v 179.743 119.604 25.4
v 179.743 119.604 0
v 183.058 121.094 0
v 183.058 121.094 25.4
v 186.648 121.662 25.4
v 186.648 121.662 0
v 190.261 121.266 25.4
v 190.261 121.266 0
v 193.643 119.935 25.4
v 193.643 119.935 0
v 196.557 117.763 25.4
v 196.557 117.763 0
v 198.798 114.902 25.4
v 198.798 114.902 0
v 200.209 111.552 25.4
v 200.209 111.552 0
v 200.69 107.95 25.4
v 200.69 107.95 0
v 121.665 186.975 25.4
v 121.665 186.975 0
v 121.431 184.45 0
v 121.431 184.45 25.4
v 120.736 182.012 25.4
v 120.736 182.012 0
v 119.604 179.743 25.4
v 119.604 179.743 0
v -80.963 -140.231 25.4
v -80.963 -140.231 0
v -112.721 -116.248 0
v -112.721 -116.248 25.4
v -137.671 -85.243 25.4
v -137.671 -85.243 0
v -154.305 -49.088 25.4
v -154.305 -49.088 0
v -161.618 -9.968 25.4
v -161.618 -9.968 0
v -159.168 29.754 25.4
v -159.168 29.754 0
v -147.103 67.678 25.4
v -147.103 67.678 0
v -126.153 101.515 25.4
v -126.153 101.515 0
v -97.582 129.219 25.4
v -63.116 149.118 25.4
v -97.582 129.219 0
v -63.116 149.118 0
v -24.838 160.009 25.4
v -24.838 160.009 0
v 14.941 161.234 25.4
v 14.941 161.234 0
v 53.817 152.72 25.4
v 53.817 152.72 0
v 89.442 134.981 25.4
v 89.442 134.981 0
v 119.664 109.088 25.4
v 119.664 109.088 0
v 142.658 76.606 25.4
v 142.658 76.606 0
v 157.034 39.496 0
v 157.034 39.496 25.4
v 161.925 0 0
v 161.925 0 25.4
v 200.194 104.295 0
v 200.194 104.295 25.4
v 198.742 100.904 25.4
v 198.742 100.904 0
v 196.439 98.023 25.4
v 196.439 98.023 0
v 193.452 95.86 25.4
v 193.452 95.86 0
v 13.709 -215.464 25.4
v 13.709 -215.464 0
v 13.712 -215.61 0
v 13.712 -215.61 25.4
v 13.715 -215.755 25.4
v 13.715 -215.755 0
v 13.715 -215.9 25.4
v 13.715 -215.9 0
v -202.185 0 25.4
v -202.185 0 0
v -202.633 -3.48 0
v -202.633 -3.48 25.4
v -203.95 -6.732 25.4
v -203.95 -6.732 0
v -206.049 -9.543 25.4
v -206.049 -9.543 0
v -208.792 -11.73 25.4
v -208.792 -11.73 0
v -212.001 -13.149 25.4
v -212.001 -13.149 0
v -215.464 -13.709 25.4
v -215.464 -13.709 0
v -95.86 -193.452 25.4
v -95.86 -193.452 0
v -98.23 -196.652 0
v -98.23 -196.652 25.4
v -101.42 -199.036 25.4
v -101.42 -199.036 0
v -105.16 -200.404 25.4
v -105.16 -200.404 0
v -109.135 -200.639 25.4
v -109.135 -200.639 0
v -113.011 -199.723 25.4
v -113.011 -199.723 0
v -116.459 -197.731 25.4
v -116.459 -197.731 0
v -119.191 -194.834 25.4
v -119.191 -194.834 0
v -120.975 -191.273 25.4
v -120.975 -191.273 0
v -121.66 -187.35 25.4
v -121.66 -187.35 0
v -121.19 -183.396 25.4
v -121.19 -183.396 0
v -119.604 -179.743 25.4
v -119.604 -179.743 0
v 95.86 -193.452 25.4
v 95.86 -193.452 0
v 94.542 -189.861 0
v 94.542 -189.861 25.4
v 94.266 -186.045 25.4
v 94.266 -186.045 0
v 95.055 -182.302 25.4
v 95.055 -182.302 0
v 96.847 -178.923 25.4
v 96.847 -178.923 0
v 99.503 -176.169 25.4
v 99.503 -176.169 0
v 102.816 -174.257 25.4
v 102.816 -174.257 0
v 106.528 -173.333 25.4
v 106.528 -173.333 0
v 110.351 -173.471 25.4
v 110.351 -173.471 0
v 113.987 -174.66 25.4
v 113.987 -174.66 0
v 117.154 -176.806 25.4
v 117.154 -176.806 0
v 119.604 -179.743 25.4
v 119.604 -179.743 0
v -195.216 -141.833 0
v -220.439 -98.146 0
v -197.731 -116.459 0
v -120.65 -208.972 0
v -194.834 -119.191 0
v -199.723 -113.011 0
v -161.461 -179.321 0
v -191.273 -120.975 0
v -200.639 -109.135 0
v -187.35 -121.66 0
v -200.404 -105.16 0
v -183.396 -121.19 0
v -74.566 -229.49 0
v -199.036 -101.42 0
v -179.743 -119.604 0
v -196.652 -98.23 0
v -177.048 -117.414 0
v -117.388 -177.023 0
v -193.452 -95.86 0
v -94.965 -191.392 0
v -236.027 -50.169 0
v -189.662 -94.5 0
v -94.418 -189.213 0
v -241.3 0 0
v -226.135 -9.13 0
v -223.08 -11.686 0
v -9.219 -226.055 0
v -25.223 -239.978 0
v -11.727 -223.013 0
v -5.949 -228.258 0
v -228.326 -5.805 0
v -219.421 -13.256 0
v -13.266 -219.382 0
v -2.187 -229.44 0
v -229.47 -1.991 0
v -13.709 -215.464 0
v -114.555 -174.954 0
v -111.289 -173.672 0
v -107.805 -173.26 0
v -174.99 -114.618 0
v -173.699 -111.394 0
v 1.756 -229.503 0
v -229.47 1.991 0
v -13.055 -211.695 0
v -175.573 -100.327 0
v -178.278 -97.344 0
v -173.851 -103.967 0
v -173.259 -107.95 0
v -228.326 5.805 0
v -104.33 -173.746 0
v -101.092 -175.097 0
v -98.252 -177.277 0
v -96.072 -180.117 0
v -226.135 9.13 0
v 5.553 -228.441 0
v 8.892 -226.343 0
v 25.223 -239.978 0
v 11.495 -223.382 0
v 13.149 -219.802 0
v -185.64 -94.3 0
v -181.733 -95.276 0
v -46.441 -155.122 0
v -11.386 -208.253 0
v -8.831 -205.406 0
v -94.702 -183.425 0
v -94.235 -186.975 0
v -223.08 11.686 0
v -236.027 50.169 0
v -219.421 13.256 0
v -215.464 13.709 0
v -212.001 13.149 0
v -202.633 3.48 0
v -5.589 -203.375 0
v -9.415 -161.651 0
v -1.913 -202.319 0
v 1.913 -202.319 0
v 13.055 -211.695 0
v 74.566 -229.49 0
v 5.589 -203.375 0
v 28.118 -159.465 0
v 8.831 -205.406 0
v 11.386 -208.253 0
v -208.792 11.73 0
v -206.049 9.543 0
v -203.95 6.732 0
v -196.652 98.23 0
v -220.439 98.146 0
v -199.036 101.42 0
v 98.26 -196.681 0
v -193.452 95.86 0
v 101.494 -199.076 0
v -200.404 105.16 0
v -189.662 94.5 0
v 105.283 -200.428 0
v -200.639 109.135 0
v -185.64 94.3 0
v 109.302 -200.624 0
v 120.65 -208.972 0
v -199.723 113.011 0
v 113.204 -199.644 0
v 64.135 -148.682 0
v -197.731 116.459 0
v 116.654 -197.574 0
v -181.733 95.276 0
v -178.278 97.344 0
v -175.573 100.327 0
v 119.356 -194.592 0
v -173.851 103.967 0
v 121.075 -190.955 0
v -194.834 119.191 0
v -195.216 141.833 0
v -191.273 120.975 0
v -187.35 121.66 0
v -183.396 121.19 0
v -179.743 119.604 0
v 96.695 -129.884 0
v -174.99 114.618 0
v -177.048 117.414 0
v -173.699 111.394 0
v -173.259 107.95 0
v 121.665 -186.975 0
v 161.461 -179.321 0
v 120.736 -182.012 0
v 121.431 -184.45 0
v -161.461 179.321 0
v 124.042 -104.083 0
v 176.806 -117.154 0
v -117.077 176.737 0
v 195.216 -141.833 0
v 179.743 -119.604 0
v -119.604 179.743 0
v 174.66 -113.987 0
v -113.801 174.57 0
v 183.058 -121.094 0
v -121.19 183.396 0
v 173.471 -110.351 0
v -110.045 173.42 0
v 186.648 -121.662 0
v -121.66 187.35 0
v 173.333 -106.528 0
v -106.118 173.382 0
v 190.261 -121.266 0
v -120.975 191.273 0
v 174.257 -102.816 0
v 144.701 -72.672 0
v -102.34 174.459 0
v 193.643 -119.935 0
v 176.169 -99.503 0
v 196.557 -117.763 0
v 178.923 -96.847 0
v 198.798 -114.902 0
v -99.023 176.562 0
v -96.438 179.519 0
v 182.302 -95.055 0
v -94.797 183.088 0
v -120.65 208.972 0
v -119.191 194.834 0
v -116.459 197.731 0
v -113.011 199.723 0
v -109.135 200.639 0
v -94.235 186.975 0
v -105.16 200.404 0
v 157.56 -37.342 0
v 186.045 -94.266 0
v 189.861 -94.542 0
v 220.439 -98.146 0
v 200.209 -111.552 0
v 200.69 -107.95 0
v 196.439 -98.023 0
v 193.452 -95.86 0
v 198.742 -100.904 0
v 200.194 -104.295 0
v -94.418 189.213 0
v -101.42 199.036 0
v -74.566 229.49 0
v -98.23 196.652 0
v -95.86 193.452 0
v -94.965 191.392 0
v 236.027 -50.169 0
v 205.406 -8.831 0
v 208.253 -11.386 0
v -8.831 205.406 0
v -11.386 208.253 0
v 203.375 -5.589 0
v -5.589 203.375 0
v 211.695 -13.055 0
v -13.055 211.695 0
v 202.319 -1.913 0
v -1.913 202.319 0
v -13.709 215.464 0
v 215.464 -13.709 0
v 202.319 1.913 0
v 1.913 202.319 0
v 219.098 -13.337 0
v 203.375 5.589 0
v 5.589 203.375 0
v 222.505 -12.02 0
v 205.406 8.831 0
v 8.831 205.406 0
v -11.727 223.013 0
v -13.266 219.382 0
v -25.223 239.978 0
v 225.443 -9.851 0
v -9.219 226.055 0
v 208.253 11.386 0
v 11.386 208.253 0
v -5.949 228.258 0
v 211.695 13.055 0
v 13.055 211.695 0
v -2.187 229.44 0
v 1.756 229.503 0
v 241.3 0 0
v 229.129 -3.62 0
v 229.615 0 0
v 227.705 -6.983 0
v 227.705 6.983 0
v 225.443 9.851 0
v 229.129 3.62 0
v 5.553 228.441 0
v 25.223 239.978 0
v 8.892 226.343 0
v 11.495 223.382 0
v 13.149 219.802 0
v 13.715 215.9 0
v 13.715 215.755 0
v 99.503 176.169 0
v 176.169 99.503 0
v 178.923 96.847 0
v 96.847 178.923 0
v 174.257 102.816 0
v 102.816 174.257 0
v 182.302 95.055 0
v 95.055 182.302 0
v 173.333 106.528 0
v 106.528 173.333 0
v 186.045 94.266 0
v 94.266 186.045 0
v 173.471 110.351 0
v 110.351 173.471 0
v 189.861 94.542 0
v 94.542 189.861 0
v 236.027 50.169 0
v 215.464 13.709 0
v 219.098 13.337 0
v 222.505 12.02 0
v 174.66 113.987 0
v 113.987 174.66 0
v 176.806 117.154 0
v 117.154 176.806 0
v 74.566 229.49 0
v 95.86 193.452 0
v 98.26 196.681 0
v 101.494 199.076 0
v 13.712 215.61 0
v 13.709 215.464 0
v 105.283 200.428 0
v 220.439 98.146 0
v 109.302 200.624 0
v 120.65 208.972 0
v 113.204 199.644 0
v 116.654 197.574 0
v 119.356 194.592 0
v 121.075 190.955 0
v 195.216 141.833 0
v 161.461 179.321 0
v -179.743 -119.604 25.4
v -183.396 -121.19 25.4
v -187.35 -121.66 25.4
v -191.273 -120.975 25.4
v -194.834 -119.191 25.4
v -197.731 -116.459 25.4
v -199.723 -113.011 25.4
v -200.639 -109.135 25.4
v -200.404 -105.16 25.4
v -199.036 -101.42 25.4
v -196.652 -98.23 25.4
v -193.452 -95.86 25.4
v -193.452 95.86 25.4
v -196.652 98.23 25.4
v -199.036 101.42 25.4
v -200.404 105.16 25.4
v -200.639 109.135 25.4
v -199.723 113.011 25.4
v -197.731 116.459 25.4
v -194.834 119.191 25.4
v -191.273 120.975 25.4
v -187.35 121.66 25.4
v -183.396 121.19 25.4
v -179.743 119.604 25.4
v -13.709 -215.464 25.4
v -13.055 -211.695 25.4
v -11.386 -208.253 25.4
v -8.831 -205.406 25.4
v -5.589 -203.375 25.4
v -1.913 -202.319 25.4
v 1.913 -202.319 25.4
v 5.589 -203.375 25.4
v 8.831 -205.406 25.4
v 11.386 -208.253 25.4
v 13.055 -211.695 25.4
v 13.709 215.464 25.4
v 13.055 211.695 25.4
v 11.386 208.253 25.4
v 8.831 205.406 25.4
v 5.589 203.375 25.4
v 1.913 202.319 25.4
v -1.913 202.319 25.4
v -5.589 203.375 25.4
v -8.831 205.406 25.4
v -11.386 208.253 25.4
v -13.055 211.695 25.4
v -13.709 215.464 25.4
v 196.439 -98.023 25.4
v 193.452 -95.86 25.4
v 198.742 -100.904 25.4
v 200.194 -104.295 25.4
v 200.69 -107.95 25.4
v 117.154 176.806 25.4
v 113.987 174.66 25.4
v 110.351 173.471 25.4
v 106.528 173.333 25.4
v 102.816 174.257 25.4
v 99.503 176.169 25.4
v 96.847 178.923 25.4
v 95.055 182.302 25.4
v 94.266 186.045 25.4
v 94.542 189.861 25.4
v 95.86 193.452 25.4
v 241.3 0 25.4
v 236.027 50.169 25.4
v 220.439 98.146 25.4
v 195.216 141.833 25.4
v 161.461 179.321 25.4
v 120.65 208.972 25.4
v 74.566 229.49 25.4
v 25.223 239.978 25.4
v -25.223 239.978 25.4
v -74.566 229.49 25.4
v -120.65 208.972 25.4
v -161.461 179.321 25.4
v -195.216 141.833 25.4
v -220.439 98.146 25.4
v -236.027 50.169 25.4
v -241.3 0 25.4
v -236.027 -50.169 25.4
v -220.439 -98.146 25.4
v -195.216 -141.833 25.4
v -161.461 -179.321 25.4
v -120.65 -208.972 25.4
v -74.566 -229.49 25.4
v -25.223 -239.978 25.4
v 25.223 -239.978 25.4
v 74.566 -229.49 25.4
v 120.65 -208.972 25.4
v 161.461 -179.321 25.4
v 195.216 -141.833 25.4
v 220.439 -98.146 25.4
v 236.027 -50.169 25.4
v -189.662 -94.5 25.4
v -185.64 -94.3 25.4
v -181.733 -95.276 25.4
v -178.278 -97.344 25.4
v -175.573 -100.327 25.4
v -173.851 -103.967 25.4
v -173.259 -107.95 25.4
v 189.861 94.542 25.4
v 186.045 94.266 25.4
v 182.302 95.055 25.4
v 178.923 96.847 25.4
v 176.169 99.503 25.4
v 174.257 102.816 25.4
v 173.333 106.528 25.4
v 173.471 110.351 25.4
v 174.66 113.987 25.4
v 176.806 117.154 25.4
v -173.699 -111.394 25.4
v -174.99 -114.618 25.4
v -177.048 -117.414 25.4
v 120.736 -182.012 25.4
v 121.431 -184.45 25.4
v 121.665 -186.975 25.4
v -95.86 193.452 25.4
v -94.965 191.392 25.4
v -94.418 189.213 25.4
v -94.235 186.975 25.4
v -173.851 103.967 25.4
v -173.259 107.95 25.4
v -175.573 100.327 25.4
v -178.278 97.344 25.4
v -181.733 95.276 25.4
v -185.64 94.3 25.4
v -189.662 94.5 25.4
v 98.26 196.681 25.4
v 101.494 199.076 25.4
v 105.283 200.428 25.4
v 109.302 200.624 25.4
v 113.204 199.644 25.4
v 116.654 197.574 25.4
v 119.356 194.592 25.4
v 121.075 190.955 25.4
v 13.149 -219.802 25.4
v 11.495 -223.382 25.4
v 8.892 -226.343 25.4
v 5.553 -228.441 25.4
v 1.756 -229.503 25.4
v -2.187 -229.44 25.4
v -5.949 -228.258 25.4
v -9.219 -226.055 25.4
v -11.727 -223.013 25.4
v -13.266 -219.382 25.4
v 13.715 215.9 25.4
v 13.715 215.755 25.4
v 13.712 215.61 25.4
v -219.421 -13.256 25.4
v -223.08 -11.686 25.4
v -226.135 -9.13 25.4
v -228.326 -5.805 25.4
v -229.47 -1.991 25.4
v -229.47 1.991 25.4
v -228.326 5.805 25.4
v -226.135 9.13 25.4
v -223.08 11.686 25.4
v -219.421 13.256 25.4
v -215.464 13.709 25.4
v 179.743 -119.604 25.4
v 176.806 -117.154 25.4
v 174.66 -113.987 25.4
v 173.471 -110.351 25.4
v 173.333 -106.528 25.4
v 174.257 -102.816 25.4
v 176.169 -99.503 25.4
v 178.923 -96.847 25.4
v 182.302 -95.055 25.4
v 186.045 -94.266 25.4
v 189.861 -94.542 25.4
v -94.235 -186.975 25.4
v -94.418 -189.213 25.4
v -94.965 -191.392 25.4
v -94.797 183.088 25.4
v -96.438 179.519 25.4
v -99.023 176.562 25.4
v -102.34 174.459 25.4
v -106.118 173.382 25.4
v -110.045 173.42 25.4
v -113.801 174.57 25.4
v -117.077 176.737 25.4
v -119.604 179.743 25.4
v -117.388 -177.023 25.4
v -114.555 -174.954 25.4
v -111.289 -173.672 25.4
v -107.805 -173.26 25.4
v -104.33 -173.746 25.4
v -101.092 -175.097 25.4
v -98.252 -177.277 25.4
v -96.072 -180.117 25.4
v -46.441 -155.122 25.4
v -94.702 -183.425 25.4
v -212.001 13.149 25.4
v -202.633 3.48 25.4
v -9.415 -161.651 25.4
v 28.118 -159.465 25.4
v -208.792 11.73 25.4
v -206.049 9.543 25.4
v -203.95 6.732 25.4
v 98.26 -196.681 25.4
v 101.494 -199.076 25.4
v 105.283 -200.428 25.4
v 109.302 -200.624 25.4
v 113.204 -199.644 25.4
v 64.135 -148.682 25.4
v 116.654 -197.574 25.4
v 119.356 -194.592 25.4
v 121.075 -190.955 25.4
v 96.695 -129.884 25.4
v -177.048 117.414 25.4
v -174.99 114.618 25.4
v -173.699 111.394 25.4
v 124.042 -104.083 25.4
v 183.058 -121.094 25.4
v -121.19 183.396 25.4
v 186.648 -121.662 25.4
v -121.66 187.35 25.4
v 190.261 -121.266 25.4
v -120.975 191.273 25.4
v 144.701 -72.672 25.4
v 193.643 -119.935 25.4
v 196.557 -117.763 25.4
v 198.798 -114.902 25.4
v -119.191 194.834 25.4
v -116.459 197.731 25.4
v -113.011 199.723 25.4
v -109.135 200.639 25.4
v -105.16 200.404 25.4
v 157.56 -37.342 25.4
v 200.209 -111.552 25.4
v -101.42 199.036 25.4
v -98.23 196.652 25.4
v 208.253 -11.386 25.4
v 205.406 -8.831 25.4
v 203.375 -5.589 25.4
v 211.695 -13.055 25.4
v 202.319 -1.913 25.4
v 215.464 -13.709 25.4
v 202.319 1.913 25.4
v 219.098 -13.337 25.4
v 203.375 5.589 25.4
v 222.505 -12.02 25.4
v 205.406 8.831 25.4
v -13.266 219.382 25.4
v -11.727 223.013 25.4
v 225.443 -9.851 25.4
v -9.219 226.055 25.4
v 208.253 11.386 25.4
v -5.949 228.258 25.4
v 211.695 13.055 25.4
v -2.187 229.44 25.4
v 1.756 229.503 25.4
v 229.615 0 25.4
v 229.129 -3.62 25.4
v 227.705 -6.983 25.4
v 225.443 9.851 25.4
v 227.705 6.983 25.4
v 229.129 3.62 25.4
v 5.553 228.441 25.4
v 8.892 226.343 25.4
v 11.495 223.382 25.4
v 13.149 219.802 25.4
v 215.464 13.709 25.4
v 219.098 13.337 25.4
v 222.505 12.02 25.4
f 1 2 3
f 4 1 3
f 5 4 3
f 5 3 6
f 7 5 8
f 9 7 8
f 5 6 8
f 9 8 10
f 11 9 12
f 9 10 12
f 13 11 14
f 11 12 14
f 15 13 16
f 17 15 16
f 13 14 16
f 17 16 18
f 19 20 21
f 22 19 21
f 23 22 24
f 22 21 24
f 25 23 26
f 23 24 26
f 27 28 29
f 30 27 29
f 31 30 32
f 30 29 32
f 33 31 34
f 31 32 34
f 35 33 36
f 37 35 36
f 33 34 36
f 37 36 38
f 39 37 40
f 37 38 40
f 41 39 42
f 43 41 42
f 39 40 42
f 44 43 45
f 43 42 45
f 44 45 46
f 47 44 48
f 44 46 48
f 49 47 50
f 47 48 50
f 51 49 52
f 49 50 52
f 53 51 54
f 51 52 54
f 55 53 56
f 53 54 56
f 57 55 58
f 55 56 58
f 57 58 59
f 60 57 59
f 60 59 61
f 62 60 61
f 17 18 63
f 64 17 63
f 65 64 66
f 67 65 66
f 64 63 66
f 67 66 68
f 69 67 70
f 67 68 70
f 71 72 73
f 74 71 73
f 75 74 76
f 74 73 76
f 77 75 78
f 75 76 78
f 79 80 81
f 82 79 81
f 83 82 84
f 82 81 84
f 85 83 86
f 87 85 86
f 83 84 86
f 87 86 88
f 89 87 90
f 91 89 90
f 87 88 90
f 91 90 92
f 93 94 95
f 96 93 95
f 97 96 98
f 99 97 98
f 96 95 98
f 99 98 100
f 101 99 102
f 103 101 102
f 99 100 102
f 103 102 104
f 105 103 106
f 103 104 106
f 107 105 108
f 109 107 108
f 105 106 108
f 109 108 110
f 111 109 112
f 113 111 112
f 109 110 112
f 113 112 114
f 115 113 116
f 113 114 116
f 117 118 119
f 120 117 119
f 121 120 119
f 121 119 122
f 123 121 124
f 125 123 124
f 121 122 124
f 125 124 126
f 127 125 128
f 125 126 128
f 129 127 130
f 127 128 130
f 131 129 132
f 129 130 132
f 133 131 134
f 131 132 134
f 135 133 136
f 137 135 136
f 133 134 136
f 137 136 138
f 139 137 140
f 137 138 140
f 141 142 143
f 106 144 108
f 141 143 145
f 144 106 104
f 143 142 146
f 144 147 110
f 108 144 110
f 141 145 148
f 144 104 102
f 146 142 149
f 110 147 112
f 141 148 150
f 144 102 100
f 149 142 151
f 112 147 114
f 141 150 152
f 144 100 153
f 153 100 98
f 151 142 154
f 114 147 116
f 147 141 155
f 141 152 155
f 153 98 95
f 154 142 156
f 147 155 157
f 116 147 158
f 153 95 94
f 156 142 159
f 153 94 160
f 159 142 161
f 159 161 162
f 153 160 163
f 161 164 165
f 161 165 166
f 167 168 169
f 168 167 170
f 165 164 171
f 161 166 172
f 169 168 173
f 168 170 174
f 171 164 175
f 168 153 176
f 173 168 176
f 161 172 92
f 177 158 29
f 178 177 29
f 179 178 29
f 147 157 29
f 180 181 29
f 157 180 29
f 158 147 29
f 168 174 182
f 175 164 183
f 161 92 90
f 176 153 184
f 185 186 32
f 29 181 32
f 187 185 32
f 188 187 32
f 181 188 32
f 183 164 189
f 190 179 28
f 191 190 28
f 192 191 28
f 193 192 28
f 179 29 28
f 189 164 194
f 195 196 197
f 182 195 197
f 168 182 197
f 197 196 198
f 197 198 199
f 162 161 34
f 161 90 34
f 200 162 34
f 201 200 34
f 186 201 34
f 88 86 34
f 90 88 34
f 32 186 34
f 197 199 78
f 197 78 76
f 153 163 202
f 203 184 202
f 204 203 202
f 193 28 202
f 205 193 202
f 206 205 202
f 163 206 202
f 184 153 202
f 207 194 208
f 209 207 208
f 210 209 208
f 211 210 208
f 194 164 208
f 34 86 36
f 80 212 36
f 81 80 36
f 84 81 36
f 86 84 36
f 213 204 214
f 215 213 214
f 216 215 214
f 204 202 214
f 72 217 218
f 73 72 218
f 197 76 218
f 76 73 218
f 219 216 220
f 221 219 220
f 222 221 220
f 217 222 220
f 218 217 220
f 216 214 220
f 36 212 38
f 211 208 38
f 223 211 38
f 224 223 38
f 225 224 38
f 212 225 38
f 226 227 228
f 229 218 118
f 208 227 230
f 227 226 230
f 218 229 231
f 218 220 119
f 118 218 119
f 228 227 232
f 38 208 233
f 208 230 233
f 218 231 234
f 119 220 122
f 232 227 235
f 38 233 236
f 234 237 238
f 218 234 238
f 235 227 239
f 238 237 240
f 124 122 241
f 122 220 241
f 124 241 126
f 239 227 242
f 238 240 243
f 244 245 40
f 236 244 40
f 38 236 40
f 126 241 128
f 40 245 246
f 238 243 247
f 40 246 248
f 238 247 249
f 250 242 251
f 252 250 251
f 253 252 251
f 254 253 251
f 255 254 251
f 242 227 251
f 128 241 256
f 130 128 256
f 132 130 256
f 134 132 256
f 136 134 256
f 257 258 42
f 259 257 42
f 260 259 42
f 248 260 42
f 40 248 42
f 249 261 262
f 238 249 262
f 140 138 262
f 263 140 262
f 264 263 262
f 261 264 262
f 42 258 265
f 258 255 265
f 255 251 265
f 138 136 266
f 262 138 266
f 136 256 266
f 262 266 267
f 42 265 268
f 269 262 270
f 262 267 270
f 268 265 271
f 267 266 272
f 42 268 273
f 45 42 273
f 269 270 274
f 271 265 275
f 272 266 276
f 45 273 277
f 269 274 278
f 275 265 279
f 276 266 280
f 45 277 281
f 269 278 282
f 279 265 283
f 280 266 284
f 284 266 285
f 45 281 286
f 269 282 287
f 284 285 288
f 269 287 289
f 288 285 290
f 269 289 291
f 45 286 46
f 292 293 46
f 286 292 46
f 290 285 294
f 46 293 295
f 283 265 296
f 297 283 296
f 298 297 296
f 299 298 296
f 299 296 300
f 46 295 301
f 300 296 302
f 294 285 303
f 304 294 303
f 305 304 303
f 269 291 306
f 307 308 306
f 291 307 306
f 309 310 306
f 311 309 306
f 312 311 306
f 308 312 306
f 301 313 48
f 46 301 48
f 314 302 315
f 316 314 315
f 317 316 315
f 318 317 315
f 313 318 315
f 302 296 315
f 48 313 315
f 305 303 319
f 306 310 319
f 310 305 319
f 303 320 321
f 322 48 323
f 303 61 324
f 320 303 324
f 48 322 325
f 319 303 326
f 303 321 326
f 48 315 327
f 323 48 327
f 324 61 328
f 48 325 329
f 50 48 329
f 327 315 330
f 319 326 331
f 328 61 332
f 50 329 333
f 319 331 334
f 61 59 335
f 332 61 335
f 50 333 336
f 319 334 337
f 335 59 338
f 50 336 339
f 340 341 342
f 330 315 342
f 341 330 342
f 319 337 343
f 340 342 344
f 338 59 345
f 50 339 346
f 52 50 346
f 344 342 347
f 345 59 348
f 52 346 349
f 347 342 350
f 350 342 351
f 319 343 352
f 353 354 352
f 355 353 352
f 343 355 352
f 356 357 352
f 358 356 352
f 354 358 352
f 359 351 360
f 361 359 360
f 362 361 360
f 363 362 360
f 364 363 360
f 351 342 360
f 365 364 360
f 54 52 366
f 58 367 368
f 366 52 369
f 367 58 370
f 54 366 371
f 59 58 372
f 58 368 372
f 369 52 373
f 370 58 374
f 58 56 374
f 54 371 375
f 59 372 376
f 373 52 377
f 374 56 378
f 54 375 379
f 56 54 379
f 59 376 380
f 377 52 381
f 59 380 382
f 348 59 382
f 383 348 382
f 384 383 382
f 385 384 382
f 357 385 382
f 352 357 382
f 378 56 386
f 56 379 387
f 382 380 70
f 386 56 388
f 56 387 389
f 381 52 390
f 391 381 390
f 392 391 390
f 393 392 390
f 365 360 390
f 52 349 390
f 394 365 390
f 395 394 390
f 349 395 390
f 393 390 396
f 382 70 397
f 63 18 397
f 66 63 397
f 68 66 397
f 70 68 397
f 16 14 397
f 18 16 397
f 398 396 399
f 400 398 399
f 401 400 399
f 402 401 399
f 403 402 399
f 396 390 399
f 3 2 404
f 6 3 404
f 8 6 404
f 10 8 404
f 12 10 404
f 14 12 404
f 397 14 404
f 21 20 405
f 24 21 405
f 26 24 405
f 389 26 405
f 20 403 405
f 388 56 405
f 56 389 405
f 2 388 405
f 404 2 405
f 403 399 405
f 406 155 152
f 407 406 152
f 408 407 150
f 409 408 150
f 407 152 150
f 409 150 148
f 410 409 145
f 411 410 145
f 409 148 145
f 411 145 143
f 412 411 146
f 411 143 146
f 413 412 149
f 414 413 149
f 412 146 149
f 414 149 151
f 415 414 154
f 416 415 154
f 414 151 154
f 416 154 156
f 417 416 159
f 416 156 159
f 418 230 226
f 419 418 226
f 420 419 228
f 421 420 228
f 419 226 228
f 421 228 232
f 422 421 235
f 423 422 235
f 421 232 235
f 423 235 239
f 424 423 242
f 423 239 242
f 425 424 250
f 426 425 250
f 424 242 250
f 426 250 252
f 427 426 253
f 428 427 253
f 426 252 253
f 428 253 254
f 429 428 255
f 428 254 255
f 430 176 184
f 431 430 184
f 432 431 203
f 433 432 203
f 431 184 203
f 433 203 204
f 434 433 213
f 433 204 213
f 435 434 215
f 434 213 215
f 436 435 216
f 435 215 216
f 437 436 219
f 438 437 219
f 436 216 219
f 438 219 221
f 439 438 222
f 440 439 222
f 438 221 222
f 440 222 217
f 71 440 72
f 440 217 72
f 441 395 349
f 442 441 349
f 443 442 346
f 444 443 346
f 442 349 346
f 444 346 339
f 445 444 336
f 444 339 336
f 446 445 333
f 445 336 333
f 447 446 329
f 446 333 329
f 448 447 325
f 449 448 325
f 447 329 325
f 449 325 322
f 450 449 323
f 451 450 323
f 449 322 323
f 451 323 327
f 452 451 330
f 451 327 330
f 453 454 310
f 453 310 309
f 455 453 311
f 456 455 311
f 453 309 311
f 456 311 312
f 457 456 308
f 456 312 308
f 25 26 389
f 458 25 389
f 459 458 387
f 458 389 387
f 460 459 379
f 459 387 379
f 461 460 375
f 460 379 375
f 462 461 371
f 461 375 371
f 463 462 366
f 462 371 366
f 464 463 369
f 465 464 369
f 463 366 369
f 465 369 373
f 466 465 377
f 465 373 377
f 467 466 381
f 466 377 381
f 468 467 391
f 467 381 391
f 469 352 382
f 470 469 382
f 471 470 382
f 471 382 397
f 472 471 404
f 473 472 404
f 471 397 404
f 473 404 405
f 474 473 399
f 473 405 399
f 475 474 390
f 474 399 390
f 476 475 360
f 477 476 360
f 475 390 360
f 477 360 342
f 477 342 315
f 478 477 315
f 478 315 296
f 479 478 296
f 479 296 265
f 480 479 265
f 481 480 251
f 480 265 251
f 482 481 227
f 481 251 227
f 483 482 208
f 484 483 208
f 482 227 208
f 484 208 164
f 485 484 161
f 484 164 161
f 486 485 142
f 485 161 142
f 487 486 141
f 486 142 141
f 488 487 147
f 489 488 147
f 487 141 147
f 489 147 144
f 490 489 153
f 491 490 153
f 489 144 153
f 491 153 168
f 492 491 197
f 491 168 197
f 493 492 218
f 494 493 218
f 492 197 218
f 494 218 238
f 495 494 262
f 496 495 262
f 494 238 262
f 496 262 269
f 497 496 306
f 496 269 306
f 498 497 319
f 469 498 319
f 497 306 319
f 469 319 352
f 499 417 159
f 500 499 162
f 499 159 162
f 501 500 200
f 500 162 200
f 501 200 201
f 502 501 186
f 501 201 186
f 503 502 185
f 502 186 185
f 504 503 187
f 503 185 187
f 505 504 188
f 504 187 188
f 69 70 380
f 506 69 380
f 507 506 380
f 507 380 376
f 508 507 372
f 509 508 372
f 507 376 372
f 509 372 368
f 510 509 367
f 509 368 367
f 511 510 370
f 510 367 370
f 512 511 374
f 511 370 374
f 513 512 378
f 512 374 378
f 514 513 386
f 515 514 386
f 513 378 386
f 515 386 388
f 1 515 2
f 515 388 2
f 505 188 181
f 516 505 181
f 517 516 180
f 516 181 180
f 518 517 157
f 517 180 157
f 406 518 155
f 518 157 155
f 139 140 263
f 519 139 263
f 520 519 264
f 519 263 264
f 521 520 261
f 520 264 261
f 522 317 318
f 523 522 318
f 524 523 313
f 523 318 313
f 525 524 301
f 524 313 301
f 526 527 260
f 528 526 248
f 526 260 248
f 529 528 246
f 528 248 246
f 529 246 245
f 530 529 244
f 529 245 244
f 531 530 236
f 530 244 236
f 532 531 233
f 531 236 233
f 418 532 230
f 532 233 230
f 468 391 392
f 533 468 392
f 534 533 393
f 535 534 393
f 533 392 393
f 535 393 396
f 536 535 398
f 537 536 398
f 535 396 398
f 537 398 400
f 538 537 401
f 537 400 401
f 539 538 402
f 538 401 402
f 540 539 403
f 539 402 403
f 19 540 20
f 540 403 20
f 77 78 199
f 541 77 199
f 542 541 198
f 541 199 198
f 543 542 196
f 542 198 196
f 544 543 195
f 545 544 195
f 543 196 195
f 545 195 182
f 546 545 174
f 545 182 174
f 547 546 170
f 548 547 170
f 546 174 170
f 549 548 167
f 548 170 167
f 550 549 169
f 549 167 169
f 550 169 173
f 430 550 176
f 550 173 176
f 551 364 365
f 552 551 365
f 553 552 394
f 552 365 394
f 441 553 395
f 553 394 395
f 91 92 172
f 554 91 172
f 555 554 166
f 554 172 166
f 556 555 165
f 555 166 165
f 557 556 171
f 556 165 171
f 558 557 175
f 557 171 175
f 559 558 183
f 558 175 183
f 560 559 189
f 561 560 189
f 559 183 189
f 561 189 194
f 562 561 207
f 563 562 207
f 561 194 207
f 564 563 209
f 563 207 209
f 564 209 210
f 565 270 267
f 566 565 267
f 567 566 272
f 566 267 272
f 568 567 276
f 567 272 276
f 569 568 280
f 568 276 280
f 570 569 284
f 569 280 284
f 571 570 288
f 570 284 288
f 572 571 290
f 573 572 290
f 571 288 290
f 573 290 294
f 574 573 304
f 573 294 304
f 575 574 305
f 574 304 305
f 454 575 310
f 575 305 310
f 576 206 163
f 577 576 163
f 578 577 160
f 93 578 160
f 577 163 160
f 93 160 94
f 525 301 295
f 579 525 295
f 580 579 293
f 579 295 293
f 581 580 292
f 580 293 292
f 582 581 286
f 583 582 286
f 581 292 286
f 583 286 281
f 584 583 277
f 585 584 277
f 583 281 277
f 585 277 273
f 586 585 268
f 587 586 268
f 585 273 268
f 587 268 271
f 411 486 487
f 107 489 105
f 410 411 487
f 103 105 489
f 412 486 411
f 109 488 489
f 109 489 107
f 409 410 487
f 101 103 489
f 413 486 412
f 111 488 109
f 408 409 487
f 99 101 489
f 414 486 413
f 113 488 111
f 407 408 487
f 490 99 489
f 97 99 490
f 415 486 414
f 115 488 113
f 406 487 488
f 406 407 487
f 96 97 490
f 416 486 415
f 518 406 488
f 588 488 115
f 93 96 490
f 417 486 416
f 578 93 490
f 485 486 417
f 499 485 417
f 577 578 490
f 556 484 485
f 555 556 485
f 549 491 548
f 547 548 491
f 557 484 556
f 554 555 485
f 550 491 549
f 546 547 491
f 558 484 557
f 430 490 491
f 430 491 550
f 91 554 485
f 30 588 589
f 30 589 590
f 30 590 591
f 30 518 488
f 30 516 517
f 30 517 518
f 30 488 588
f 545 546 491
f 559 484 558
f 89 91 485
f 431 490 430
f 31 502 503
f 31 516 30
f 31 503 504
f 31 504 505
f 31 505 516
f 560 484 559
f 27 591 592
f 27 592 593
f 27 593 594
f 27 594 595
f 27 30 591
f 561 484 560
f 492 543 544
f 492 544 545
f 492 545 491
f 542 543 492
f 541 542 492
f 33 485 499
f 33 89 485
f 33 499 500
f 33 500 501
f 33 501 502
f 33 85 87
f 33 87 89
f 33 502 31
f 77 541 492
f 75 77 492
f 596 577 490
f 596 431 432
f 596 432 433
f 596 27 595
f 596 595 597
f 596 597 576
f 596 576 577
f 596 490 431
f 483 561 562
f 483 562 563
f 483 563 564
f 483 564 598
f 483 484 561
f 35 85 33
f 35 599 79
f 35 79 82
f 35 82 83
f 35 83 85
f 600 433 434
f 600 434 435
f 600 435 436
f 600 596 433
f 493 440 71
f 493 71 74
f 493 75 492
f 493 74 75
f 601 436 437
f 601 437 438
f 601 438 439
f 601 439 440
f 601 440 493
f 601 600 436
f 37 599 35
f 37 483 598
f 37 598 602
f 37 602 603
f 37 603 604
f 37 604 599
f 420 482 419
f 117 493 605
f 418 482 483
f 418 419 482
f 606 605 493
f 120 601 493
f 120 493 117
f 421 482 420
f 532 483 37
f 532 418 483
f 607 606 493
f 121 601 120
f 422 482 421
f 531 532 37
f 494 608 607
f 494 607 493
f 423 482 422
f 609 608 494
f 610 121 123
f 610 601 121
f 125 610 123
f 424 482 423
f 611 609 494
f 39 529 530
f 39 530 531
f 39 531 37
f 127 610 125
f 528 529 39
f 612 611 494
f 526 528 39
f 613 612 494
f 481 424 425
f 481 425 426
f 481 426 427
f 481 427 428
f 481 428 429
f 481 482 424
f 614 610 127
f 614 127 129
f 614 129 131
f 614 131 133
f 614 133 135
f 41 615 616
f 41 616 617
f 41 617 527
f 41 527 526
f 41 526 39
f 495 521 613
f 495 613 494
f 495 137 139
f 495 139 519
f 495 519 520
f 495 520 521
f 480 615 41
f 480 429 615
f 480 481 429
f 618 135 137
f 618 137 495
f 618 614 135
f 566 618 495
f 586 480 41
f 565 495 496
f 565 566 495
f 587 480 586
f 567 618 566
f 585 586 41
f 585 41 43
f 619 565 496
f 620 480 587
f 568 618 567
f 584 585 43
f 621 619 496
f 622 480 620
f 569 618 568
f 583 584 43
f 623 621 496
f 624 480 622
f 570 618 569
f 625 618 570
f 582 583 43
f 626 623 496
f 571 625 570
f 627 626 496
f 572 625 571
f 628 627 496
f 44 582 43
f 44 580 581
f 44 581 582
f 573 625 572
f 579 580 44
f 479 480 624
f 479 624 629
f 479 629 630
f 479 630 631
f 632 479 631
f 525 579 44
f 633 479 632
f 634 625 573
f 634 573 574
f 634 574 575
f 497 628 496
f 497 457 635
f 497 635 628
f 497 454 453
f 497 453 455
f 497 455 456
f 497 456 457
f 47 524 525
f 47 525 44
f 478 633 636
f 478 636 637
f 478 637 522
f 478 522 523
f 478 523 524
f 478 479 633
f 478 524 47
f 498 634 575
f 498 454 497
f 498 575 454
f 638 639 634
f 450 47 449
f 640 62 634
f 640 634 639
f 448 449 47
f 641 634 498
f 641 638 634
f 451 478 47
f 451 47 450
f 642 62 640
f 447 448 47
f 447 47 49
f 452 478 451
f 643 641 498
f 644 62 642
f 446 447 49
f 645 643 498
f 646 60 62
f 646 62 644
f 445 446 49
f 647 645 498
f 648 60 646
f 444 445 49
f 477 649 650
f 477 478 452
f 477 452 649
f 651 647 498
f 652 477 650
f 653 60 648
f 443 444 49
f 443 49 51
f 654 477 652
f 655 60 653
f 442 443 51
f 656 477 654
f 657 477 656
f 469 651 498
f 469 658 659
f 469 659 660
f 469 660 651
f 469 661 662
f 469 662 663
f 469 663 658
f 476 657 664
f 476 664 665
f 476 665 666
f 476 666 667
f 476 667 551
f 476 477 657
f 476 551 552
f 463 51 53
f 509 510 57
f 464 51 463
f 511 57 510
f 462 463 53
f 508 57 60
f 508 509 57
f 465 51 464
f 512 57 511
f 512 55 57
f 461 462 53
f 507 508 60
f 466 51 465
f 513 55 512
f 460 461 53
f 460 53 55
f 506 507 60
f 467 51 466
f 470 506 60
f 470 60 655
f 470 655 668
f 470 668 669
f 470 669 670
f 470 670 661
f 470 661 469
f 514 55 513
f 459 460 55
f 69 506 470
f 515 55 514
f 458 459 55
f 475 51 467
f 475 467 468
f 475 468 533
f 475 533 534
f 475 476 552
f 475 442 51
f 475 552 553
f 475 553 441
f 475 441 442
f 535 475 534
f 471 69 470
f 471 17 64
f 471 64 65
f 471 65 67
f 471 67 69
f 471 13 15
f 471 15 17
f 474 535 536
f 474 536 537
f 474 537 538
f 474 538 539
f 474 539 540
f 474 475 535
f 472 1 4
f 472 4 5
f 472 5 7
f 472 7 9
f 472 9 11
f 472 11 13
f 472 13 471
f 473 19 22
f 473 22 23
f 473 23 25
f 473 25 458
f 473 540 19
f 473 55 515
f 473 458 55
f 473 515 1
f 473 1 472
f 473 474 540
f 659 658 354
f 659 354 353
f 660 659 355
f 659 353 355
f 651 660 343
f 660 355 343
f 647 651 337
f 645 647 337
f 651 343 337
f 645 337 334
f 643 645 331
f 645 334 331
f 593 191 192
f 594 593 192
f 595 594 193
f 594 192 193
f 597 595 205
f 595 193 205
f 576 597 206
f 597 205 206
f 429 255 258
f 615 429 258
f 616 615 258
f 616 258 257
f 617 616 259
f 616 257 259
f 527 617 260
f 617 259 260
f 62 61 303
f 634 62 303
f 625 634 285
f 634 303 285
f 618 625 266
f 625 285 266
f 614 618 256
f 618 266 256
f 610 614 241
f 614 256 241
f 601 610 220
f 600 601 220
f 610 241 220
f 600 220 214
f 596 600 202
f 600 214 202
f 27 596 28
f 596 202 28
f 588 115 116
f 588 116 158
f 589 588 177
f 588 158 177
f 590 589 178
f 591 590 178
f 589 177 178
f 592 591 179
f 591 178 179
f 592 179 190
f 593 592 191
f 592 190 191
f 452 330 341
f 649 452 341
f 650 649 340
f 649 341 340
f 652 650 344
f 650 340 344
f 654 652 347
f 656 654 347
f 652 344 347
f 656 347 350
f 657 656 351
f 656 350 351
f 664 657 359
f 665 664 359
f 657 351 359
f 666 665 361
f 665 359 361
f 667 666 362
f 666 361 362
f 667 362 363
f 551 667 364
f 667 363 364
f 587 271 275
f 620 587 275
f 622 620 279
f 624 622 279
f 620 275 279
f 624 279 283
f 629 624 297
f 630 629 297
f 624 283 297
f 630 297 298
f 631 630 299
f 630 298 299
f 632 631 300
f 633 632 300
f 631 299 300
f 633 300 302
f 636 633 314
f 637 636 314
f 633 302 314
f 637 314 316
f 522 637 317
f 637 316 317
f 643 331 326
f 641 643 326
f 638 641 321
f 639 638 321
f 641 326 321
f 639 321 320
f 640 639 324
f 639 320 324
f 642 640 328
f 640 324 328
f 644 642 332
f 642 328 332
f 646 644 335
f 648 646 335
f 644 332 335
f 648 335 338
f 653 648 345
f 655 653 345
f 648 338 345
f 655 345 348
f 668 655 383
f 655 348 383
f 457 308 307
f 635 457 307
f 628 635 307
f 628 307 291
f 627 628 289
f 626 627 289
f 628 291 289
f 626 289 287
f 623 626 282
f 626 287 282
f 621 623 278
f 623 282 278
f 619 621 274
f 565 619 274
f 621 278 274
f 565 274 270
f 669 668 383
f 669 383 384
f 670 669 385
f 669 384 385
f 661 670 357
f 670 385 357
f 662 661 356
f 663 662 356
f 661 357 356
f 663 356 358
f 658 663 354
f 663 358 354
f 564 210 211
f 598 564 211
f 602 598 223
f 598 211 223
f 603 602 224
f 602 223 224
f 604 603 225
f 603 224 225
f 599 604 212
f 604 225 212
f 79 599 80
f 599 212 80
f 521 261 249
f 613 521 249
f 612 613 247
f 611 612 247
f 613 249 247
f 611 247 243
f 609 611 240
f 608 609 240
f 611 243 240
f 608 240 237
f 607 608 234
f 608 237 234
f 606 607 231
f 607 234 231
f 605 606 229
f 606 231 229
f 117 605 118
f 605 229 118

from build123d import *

# Parameters (mm, degrees)
F0_R     = 241.3
F1_DEPTH = 25.4


with BuildPart() as f1:
    # F0 (on Top) → F1 (new body)
    with BuildSketch(Plane.XY):
        with BuildLine():
            ThreePointArc((-80.9625, -140.231164), (80.9625, -140.231164), (161.925, 0))
            ThreePointArc((161.925, 0), (-80.9625, 140.231164), (-80.9625, -140.231164))
        make_face()
        Circle(F0_R)
        with BuildLine():
            ThreePointArc((-95.860263, -193.451854), (-114.807712, -198.852791), (-119.604089, -179.74335))
            ThreePointArc((-119.604089, -179.74335), (-152.664354, -152.664354), (-179.74335, -119.604089))
            ThreePointArc((-179.74335, -119.604089), (-198.852791, -114.807712), (-193.451854, -95.860263))
            ThreePointArc((-193.451854, -95.860263), (-208.543386, -55.879032), (-215.464352, -13.708504))
            ThreePointArc((-215.464352, -13.708504), (-229.615425, 0), (-215.464352, 13.708504))
            ThreePointArc((-215.464352, 13.708504), (-208.543386, 55.879032), (-193.451854, 95.860263))
            ThreePointArc((-193.451854, 95.860263), (-198.852791, 114.807712), (-179.74335, 119.604089))
            ThreePointArc((-179.74335, 119.604089), (-152.664354, 152.664354), (-119.604089, 179.74335))
            ThreePointArc((-119.604089, 179.74335), (-114.807712, 198.852791), (-95.860263, 193.451854))
            ThreePointArc((-95.860263, 193.451854), (-55.879032, 208.543386), (-13.708504, 215.464352))
            ThreePointArc((-13.708504, 215.464352), (-0.217852, 229.613695), (13.715425, 215.9))
            ThreePointArc((13.715425, 215.9), (13.713695, 215.682148), (13.708504, 215.464352))
            ThreePointArc((13.708504, 215.464352), (55.879032, 208.543386), (95.860263, 193.451854))
            ThreePointArc((95.860263, 193.451854), (111.288937, 200.277681), (121.665425, 186.974885))
            ThreePointArc((121.665425, 186.974885), (121.140028, 183.215091), (119.604089, 179.74335))
            ThreePointArc((119.604089, 179.74335), (152.664354, 152.664354), (179.74335, 119.604089))
            ThreePointArc((179.74335, 119.604089), (193.643067, 119.935334), (200.69031, 107.95))
            ThreePointArc((200.69031, 107.95), (198.742367, 100.904488), (193.451854, 95.860263))
            ThreePointArc((193.451854, 95.860263), (208.543386, 55.879032), (215.464352, 13.708504))
            ThreePointArc((215.464352, 13.708504), (225.443002, 9.851091), (229.615425, 0))
            ThreePointArc((229.615425, 0), (225.443002, -9.851091), (215.464352, -13.708504))
            ThreePointArc((215.464352, -13.708504), (208.543386, -55.879032), (193.451854, -95.860263))
            ThreePointArc((193.451854, -95.860263), (198.742367, -100.904488), (200.69031, -107.95))
            ThreePointArc((200.69031, -107.95), (193.643067, -119.935334), (179.74335, -119.604089))
            ThreePointArc((179.74335, -119.604089), (152.664354, -152.664354), (119.604089, -179.74335))
            ThreePointArc((119.604089, -179.74335), (121.140028, -183.215091), (121.665425, -186.974885))
            ThreePointArc((121.665425, -186.974885), (111.288937, -200.277681), (95.860263, -193.451854))
            ThreePointArc((95.860263, -193.451854), (55.879032, -208.543386), (13.708504, -215.464352))
            ThreePointArc((13.708504, -215.464352), (13.713695, -215.682148), (13.715425, -215.9))
            ThreePointArc((13.715425, -215.9), (-0.217852, -229.613695), (-13.708504, -215.464352))
            ThreePointArc((-13.708504, -215.464352), (-55.879032, -208.543386), (-95.860263, -193.451854))
        make_face(mode=Mode.SUBTRACT)
        with BuildLine():
            ThreePointArc((-119.604089, -179.74335), (-111.288937, -173.672089), (-101.092288, -175.096978))
            ThreePointArc((-101.092288, -175.096978), (-96.072094, -180.117172), (-94.234575, -186.974885))
            ThreePointArc((-94.234575, -186.974885), (-94.647204, -190.313822), (-95.860263, -193.451854))
            ThreePointArc((-95.860263, -193.451854), (-55.879032, -208.543386), (-13.708504, -215.464352))
            ThreePointArc((-13.708504, -215.464352), (0, -202.184575), (13.708504, -215.464352))
            ThreePointArc((13.708504, -215.464352), (55.879032, -208.543386), (95.860263, -193.451854))
            ThreePointArc((95.860263, -193.451854), (101.092288, -175.096978), (119.604089, -179.74335))
            ThreePointArc((119.604089, -179.74335), (152.664354, -152.664354), (179.74335, -119.604089))
            ThreePointArc((179.74335, -119.604089), (175.096978, -101.092288), (193.451854, -95.860263))
            ThreePointArc((193.451854, -95.860263), (208.543386, -55.879032), (215.464352, -13.708504))
            ThreePointArc((215.464352, -13.708504), (202.184575, 0), (215.464352, 13.708504))
            ThreePointArc((215.464352, 13.708504), (208.543386, 55.879032), (193.451854, 95.860263))
            ThreePointArc((193.451854, 95.860263), (175.096978, 101.092288), (179.74335, 119.604089))
            ThreePointArc((179.74335, 119.604089), (152.664354, 152.664354), (119.604089, 179.74335))
            ThreePointArc((119.604089, 179.74335), (101.092288, 175.096978), (95.860263, 193.451854))
            ThreePointArc((95.860263, 193.451854), (55.879032, 208.543386), (13.708504, 215.464352))
            ThreePointArc((13.708504, 215.464352), (0, 202.184575), (-13.708504, 215.464352))
            ThreePointArc((-13.708504, 215.464352), (-55.879032, 208.543386), (-95.860263, 193.451854))
            ThreePointArc((-95.860263, 193.451854), (-94.647204, 190.313822), (-94.234575, 186.974885))
            ThreePointArc((-94.234575, 186.974885), (-104.190206, 173.784857), (-119.604089, 179.74335))
            ThreePointArc((-119.604089, 179.74335), (-152.664354, 152.664354), (-179.74335, 119.604089))
            ThreePointArc((-179.74335, 119.604089), (-174.989551, 114.618182), (-173.25946, 107.95))
            ThreePointArc((-173.25946, 107.95), (-179.929372, 96.182518), (-193.451854, 95.860263))
            ThreePointArc((-193.451854, 95.860263), (-208.543386, 55.879032), (-215.464352, 13.708504))
            ThreePointArc((-215.464352, 13.708504), (-206.048909, 9.543002), (-202.184575, 0))
            ThreePointArc((-202.184575, 0), (-206.048909, -9.543002), (-215.464352, -13.708504))
            ThreePointArc((-215.464352, -13.708504), (-208.543386, -55.879032), (-193.451854, -95.860263))
            ThreePointArc((-193.451854, -95.860263), (-179.929372, -96.182518), (-173.25946, -107.95))
            ThreePointArc((-173.25946, -107.95), (-174.989551, -114.618182), (-179.74335, -119.604089))
            ThreePointArc((-179.74335, -119.604089), (-152.664354, -152.664354), (-119.604089, -179.74335))
        make_face()
        with BuildLine():
            ThreePointArc((-80.9625, -140.231164), (-80.9625, 140.231164), (161.925, 0))
            ThreePointArc((161.925, 0), (80.9625, -140.231164), (-80.9625, -140.231164))
        make_face(mode=Mode.SUBTRACT)
    extrude(amount=F1_DEPTH)


solid = f1.part
